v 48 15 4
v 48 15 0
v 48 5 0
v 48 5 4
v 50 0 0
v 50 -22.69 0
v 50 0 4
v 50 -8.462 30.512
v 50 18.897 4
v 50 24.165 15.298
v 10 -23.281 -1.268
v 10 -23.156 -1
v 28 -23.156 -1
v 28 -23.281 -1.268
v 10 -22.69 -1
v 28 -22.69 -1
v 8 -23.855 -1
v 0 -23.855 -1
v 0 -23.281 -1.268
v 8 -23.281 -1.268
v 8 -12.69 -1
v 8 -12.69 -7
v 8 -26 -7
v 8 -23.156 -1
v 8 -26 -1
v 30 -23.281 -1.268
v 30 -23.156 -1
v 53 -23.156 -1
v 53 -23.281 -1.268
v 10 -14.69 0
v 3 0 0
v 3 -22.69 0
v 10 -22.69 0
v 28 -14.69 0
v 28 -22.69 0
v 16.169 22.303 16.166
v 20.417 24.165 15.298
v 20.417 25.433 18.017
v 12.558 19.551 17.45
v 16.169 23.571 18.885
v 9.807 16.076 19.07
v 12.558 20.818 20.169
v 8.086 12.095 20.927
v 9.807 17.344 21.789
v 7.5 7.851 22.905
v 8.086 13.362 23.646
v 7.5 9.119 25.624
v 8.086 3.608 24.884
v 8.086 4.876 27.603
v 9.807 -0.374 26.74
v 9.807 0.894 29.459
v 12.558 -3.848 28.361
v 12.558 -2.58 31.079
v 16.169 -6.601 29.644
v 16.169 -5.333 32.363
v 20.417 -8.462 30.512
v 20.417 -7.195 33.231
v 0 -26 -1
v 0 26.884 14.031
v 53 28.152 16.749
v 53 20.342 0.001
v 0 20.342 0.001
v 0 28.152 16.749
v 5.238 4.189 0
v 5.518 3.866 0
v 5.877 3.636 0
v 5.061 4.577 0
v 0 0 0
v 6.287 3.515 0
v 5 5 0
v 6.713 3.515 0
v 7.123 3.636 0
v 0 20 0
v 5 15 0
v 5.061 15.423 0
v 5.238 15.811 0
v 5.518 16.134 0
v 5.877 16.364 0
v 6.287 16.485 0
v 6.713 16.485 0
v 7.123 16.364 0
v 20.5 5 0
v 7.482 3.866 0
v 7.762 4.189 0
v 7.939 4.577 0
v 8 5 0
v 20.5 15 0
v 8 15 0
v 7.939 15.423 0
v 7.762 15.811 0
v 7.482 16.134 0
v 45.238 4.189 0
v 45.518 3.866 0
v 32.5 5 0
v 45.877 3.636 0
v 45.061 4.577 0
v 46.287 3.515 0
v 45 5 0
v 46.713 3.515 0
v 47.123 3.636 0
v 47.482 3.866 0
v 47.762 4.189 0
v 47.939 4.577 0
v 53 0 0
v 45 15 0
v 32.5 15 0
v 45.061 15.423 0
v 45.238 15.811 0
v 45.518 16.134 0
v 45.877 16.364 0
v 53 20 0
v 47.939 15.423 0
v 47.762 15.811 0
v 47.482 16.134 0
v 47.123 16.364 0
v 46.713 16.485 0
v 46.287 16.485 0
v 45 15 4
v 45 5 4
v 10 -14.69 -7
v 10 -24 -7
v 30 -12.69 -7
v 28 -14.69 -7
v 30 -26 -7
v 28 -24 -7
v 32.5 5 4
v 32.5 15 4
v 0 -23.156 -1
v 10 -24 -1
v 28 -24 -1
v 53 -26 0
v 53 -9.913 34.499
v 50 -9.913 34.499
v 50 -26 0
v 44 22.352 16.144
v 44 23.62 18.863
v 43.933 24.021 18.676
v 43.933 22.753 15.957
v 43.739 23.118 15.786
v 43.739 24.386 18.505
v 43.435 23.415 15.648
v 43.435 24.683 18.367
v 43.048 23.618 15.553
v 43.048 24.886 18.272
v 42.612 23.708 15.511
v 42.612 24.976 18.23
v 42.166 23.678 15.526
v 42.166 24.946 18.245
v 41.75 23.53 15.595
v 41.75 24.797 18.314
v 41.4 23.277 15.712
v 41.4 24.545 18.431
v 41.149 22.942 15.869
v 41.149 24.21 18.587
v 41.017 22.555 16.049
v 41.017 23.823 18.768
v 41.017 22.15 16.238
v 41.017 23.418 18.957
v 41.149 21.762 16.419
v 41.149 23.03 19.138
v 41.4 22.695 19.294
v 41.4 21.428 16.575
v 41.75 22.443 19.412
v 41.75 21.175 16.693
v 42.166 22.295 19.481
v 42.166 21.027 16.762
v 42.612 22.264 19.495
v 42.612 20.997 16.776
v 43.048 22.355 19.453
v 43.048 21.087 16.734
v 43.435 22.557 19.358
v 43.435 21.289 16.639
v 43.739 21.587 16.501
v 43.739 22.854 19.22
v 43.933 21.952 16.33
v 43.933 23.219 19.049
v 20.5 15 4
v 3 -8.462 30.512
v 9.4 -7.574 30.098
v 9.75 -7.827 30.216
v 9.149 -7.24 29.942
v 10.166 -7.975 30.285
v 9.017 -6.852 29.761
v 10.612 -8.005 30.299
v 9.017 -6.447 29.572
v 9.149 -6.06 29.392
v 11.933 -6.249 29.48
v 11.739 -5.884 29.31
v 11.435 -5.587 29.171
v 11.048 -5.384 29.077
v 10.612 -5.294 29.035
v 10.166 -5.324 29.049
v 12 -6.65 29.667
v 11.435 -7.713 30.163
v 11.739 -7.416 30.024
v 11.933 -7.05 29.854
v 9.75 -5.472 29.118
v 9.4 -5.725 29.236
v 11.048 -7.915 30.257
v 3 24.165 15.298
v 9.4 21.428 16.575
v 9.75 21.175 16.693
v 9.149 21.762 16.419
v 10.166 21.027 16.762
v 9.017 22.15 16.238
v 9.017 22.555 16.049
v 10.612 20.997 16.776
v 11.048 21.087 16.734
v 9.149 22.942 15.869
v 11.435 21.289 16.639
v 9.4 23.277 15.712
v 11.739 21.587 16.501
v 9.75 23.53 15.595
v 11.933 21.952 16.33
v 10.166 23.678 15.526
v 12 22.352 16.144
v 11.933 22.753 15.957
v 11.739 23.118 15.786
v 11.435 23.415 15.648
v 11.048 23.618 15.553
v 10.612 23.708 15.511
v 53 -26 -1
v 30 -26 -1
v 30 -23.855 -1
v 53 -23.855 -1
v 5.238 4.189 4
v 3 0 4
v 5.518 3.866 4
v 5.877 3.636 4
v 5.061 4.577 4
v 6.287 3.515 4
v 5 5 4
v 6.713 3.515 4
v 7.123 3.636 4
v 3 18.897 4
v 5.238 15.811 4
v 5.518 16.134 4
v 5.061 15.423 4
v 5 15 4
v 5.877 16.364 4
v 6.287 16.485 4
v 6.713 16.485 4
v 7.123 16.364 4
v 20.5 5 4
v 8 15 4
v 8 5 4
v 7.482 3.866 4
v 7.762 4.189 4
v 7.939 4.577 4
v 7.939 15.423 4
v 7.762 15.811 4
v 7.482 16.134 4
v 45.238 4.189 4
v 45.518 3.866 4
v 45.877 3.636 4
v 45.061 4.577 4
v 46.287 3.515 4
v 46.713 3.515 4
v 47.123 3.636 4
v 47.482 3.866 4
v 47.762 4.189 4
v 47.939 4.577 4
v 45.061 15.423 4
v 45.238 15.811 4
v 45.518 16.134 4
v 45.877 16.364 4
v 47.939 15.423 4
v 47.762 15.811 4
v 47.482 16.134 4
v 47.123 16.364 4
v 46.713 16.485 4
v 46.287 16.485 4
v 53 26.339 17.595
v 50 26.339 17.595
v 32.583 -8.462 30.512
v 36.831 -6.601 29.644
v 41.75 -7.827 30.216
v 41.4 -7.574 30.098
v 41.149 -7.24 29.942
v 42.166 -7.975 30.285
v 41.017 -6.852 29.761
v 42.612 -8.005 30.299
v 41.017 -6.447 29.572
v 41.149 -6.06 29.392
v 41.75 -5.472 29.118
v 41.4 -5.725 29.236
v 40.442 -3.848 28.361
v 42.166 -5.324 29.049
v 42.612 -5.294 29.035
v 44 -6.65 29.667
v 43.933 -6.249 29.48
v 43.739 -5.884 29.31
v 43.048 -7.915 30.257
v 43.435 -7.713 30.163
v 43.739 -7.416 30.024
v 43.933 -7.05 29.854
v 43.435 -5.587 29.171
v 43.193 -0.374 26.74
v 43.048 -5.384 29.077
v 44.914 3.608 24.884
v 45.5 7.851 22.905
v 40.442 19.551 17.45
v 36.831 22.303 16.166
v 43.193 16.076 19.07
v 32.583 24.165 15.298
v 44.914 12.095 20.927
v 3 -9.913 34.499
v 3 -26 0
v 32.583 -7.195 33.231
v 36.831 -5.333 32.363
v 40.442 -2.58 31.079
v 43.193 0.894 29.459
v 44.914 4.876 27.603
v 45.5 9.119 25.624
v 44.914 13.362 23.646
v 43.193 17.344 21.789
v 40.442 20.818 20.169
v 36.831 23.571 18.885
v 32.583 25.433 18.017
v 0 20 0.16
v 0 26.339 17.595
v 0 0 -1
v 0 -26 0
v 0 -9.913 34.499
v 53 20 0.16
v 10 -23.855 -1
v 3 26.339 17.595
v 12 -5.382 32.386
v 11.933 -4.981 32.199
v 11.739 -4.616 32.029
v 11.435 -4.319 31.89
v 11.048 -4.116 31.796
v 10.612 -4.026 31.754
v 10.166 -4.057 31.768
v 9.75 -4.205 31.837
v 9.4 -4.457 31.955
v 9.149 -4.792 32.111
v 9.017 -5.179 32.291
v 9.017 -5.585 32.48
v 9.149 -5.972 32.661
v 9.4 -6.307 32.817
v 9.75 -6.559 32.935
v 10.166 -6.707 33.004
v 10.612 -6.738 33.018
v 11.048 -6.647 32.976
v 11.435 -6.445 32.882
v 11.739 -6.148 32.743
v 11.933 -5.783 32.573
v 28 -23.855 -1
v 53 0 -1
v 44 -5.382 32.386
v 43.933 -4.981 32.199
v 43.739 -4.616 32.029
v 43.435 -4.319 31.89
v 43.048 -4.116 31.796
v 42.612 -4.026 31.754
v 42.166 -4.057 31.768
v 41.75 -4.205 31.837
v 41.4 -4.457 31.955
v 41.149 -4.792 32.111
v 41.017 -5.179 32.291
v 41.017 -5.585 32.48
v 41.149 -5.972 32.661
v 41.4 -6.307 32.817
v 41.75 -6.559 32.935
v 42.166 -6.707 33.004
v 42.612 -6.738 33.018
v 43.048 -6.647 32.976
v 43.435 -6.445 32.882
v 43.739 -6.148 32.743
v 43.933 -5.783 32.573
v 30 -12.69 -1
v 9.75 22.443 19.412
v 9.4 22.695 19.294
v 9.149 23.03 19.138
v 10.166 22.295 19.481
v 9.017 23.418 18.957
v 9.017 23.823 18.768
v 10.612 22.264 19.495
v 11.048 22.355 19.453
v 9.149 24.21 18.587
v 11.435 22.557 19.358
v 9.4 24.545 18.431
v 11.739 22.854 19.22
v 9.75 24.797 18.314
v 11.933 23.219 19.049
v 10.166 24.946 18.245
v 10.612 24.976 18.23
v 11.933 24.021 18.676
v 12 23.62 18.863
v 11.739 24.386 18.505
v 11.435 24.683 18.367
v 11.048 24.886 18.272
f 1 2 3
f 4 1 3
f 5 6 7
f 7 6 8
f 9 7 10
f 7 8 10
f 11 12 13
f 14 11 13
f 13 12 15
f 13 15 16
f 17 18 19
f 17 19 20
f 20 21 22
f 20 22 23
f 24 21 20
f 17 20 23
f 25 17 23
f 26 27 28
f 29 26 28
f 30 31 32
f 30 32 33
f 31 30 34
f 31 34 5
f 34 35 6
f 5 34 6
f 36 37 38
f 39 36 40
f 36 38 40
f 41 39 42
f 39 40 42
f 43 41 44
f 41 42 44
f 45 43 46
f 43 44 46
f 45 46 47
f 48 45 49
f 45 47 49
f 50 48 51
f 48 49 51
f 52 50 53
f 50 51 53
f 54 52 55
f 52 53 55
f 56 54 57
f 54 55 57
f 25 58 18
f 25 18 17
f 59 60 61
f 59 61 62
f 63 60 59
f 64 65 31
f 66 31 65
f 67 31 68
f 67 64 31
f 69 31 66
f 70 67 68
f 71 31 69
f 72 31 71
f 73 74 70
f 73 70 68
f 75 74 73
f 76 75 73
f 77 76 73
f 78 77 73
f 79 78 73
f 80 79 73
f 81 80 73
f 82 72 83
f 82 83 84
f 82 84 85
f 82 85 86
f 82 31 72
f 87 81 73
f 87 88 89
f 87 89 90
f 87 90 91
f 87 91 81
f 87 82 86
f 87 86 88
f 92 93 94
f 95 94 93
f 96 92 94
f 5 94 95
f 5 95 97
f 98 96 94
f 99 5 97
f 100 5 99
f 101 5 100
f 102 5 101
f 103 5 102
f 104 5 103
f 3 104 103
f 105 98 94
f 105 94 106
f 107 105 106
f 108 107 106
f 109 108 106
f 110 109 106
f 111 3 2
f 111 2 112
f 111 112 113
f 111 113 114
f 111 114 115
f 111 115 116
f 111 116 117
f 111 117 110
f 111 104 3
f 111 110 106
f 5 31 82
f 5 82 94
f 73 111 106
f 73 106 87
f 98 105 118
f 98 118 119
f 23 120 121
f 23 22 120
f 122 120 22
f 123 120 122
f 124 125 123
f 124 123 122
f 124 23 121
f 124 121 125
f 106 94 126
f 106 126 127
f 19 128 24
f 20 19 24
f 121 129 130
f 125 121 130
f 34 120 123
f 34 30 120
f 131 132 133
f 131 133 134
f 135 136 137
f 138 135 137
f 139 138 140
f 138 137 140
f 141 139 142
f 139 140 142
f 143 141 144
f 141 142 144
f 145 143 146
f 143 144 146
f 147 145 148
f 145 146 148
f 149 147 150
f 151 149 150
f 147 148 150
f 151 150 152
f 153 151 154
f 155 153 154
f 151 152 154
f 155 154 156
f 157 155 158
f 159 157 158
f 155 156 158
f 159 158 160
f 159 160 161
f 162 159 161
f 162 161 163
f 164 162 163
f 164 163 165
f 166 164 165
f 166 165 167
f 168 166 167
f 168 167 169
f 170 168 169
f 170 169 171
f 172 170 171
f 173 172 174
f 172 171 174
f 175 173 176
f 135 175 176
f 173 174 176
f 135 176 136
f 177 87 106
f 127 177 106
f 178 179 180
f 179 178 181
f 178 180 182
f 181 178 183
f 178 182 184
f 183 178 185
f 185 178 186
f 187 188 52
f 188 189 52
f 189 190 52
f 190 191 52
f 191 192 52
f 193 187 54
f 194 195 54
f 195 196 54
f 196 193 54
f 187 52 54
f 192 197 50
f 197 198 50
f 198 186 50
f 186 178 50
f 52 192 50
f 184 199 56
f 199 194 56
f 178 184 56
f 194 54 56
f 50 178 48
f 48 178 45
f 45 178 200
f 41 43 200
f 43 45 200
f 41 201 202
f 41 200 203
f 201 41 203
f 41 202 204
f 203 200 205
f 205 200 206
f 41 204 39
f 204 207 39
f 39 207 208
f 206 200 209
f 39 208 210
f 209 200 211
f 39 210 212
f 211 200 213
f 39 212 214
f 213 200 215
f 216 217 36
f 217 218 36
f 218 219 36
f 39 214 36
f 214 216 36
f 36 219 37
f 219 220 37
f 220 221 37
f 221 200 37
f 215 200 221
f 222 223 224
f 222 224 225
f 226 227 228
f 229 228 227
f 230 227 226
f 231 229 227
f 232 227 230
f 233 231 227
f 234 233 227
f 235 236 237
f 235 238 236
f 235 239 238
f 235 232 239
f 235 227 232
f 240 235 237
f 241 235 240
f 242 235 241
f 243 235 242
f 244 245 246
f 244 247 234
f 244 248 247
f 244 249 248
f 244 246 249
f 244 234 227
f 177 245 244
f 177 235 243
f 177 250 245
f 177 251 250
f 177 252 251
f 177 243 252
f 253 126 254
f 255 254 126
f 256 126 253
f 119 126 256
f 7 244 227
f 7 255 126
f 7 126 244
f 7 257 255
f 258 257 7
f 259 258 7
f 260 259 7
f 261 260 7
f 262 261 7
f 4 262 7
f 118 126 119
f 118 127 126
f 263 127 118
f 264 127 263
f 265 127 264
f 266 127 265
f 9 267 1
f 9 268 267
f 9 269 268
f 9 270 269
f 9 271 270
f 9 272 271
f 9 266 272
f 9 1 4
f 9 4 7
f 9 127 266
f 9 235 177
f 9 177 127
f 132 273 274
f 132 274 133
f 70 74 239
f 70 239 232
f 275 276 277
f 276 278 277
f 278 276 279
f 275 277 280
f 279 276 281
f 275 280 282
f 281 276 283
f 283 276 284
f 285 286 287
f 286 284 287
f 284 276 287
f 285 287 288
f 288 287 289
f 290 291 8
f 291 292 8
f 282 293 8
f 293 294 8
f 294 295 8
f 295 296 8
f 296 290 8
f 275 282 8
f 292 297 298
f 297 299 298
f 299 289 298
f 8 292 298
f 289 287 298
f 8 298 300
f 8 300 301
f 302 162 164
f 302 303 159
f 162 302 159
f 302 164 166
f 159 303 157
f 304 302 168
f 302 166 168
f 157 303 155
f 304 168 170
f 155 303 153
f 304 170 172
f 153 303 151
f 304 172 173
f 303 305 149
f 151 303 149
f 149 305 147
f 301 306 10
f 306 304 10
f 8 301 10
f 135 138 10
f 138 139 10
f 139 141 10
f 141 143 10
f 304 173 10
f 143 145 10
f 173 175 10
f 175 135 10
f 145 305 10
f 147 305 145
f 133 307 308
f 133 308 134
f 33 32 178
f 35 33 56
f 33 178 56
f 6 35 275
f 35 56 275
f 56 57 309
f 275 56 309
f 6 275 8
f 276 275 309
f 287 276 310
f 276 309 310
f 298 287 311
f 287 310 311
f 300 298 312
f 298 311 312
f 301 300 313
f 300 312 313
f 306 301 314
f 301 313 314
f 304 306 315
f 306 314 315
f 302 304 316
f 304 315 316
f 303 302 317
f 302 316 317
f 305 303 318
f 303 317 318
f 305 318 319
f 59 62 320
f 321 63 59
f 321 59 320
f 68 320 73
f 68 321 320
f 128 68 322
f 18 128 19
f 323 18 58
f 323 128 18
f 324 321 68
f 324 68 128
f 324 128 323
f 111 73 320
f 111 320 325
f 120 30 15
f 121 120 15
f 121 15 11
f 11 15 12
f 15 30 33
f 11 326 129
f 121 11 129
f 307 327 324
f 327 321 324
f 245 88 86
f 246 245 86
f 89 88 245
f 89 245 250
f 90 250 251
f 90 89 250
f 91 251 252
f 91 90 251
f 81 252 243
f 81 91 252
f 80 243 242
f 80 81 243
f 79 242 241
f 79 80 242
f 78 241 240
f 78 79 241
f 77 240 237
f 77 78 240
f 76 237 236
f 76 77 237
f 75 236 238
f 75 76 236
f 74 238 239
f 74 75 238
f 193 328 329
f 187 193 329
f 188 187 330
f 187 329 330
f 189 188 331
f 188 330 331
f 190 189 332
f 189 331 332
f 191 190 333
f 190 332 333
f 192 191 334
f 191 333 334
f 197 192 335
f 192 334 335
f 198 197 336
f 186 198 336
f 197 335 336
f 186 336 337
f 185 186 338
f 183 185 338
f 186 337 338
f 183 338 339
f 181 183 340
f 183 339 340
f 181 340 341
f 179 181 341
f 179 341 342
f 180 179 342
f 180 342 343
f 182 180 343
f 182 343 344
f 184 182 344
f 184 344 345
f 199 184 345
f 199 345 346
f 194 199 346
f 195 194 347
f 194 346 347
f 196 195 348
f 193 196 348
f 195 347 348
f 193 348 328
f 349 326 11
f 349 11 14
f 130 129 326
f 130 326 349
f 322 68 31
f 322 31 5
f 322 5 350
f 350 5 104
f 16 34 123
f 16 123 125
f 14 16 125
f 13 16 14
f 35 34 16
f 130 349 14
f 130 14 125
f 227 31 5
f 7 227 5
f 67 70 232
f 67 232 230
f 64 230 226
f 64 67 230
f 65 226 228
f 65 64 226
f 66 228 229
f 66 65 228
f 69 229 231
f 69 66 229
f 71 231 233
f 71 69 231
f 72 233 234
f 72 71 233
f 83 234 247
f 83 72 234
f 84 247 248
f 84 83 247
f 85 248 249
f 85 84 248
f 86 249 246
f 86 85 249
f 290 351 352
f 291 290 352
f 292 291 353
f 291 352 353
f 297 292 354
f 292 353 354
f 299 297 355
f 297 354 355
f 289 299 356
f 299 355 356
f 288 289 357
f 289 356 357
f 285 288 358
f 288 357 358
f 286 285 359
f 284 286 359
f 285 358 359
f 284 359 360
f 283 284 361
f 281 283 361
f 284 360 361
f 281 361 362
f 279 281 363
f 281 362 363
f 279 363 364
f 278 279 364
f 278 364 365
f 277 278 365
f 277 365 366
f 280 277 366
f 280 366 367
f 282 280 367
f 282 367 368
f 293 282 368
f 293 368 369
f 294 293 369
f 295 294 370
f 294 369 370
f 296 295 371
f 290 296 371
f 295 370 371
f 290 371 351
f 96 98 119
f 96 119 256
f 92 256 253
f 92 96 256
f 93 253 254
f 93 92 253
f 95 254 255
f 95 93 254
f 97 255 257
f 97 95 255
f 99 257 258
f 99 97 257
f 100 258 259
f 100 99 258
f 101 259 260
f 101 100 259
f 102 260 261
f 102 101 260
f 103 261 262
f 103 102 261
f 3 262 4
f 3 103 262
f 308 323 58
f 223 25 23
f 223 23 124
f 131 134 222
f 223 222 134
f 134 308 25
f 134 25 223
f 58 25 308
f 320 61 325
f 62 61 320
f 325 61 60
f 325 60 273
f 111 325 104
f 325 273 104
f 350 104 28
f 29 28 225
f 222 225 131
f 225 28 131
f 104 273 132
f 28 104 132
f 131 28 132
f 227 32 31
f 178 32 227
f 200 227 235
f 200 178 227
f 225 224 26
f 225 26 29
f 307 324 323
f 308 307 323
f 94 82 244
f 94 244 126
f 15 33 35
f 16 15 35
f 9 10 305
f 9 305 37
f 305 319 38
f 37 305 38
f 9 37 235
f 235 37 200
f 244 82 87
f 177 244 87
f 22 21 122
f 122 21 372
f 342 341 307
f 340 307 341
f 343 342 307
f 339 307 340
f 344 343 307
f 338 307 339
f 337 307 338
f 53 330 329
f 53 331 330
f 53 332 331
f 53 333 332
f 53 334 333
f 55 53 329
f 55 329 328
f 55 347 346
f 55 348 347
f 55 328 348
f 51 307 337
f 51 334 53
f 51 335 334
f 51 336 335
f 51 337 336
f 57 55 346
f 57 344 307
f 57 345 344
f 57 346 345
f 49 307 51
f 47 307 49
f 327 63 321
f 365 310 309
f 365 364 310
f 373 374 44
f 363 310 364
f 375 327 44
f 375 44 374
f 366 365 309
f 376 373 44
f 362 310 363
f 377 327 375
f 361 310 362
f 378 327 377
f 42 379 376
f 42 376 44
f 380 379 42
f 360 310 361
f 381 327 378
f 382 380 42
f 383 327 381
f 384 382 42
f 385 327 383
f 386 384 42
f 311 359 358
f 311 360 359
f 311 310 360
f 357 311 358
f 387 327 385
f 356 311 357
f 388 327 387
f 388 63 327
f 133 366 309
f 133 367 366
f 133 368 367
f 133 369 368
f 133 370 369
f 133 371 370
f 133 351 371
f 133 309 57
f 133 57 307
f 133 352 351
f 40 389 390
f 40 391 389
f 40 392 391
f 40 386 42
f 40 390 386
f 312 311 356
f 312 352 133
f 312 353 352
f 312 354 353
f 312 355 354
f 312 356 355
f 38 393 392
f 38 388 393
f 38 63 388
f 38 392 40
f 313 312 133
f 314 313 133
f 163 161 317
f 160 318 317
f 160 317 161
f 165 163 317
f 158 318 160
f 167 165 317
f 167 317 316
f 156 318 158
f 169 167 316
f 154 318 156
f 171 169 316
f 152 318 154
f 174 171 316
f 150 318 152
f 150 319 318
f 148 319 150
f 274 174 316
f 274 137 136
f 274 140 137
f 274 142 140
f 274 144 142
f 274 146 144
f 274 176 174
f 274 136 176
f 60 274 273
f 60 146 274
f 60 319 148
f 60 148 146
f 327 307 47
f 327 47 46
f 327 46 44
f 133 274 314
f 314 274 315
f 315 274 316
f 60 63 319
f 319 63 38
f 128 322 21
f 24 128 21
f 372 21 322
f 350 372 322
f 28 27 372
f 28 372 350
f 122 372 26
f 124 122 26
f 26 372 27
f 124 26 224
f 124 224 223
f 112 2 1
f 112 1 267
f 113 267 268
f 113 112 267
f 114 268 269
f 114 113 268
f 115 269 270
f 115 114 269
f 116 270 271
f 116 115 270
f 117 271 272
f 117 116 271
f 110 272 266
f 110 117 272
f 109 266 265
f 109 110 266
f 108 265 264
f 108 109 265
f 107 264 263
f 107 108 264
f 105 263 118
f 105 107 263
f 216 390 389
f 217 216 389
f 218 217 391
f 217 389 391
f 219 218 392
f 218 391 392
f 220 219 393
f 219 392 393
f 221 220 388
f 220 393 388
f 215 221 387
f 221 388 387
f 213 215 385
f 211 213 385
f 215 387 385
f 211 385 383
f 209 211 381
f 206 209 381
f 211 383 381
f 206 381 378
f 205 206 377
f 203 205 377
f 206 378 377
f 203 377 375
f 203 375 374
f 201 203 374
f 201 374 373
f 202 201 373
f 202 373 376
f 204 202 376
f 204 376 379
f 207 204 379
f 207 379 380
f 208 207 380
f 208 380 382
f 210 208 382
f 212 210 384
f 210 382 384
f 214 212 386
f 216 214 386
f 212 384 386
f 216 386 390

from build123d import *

# Parameters (mm, degrees)
SKETCH_W      = 53
SKETCH_H      = 20
SKETCH_W_2    = 12
SKETCH_H_2    = 10
PAD_DEPTH     = 4
PAD001_DEPTH  = 3
PAD002_DEPTH  = 3
SKETCH002_W   = 53
SKETCH002_H   = 38.0651251893
PAD003_DEPTH  = 3
SKETCH003_W   = 53
SKETCH003_H   = 42
SKETCH003_R   = 19
SKETCH003_R_2 = 1.5
PAD004_DEPTH  = 3
SKETCH004_W   = 53
SKETCH004_H   = 18.48
PAD005_DEPTH  = 3
SKETCH005_W   = 53
SKETCH005_H   = 26
SKETCH005_W_2 = 18
SKETCH005_H_2 = 8
PAD006_DEPTH  = 1
SKETCH006_W   = 22
SKETCH006_H   = 13.310112688
SKETCH006_W_2 = 18
SKETCH006_H_2 = 9.310112688
PAD007_DEPTH  = 6


with BuildPart() as part:
    # Sketch → Pad (new body)
    with BuildSketch(Plane.XY):
        with Locations((26.5, 10)):
            Rectangle(SKETCH_W, SKETCH_H)
        with BuildLine():
            ThreePointArc((48, 15), (46.5, 16.5), (45, 15))
            Line((45, 15), (45, 5))
            ThreePointArc((45, 5), (46.5, 3.5), (48, 5))
            Line((48, 15), (48, 5))
        make_face(mode=Mode.SUBTRACT)
        with BuildLine():
            ThreePointArc((8, 15), (6.5, 16.5), (5, 15))
            Line((5, 15), (5, 5))
            ThreePointArc((5, 5), (6.5, 3.5), (8, 5))
            Line((8, 15), (8, 5))
        make_face(mode=Mode.SUBTRACT)
        with Locations((26.5, 10)):
            Rectangle(SKETCH_W_2, SKETCH_H_2, mode=Mode.SUBTRACT)
    extrude(amount=PAD_DEPTH)

    # Sketch001 (on Face1 of Pad) → Pad001 (join)
    with BuildSketch(Plane(origin=(0, 0, 0), x_dir=(0, -1, 0), z_dir=(-1, 0, 0))):
        Polygon((-26.3390883587, 17.5947033355), (9.9134538694, 34.4989389586), (26, 0), (0, 0), (0, 4), (-20, 4), align=None)
    extrude(amount=-PAD001_DEPTH)

    # CopySketch002 → Pad002 (join)
    with BuildSketch(Plane(origin=(53, 0, 0), x_dir=(0, -1, 0), z_dir=(-1, 0, 0))):
        Polygon((-26.3390883587, 17.5947033355), (9.9134538694, 34.4989389586), (26, 0), (0, 0), (0, 4), (-20, 4), align=None)
    extrude(amount=PAD002_DEPTH)

    # Sketch002 (on Face30 of Pad002) → Pad003 (join)
    with BuildSketch(Plane(origin=(0, -21.3565107925, 9.9583496311), x_dir=(1, 0, 0), z_dir=(0, -0.9063135557, 0.4226058906))):
        with Locations((26.5, 8.0448094397)):
            Rectangle(SKETCH002_W, SKETCH002_H)
    extrude(amount=-PAD003_DEPTH)

    # Sketch003 (on Face27 of Pad003) → Pad004 (join)
    with BuildSketch(Plane(origin=(0, 11.4430569231, 24.5405893275), x_dir=(1, 0, 0), z_dir=(0, 0.4226058906, 0.9063135557))):
        with Locations((26.5, -2.5641524483)):
            Rectangle(SKETCH003_W, SKETCH003_H)
        with Locations((26.5, -2.5641524483)):
            Circle(SKETCH003_R, mode=Mode.SUBTRACT)
        with Locations((42.5, 13.4358475517)):
            Circle(SKETCH003_R_2, mode=Mode.SUBTRACT)
        with Locations((10.5, 13.4358475517)):
            Circle(SKETCH003_R_2, mode=Mode.SUBTRACT)
        with Locations((10.5, -18.5641524483)):
            Circle(SKETCH003_R_2, mode=Mode.SUBTRACT)
        with Locations((42.5, -18.5641524483)):
            Circle(SKETCH003_R_2, mode=Mode.SUBTRACT)
    extrude(amount=-PAD004_DEPTH)

    # Sketch004 (on Face41 of Pad004) → Pad005 (join)
    with BuildSketch(Plane(origin=(0, 16.708658547, -7.7910977731), x_dir=(-1, 0, 0), z_dir=(0, 0.9063135557, -0.4226058906))):
        with Locations((-26.5, 17.8373720343)):
            Rectangle(SKETCH004_W, SKETCH004_H)
    extrude(amount=-PAD005_DEPTH)

    # Sketch005 (on Face6 of Pad005) → Pad006 (join)
    with BuildSketch(Plane(origin=(0, 0, 0), x_dir=(1, 0, 0), z_dir=(0, 0, -1))):
        with Locations((26.5, 13)):
            Rectangle(SKETCH005_W, SKETCH005_H)
        with Locations((19, 18.689887312)):
            Rectangle(SKETCH005_W_2, SKETCH005_H_2, mode=Mode.SUBTRACT)
    extrude(amount=PAD006_DEPTH)

    # Sketch006 (on Face27 of Pad006) → Pad007 (join)
    with BuildSketch(Plane(origin=(0, 0, -1), x_dir=(1, 0, 0), z_dir=(0, 0, -1))):
        with Locations((19, 19.344943656)):
            Rectangle(SKETCH006_W, SKETCH006_H)
        with Locations((19, 19.344943656)):
            Rectangle(SKETCH006_W_2, SKETCH006_H_2, mode=Mode.SUBTRACT)
    extrude(amount=PAD007_DEPTH)


solid = part.part
